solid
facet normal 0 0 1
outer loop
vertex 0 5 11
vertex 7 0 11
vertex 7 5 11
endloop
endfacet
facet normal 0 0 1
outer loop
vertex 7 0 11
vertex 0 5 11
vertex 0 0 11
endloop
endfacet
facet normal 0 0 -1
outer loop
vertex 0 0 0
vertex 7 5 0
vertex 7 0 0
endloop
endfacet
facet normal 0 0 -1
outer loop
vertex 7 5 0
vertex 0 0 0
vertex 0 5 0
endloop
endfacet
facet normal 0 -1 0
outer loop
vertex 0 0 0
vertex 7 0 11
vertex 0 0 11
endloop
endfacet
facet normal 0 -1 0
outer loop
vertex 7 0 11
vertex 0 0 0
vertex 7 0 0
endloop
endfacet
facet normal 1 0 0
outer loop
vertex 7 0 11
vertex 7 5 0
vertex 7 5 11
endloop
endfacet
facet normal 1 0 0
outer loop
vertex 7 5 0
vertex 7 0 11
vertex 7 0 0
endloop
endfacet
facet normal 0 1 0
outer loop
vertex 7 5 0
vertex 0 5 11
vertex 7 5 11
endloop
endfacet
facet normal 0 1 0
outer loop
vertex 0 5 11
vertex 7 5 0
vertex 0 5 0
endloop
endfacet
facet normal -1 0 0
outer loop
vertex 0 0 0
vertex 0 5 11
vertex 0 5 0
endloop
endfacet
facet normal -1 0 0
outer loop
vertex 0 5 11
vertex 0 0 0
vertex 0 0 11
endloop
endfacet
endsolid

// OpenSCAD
// Generated by SolidPython 1.0.1 on 2020-07-29 00:46:55


cube(size = [7, 5, 11]);
/***********************************************
*********      SolidPython code:      **********
************************************************
 
# import packages: SolidPython
from solid import *
from solid.utils import *
from itertools import chain, combinations, permutations


class Resize:

    def __init__(self, scad_file):
        self.scad_file = scad_file
        #self.scad_file = import_scad(scad_file)
        # cone/cylinder param:
        self.r1 = 0
        self.r2 = 0
        self.h = 0
        # rectangular prism param:
        self.w = 0
        self.l = 0
        # ellipse param:
        self.r = 0

    # import OpenScad code (file name corresponds to shape)


    # classify shape + parameters
    def assign(self, param1, param2, param3):
        if self.scad_file == 'cone.scad':
            self.r1 = param1
            self.r2 = param2
            self.h = param3
        elif self.scad_file == 'cylinder.scad':
            self.r1 = param1
            self.r2 = param2
            self.h = param3
        elif self.scad_file == 'rectangularPrism.scad':
            self.h = param1
            self.l = param2
            self.w = param3
        else:
            self.r = param1
            self.h = param2

    # resize parameters
    def iterate(self):
        x = range(3, 20, 2)
        i = 1
        if self.scad_file == 'cone.scad':
            tempList = list(permutations(x, 2))
            for temp in tempList:
                param1 = temp[0]
                param2 = temp[1]
                filepath = 'produced_scad_files/' + 'cone' + str(param1) + '_' + str(param2) + '_' + '.scad'
                scad_render_to_file(cylinder(h=param1, r1=param2, r2=0), filepath)

        elif self.scad_file == 'cylinder.scad':
            tempList = list(permutations(x, 3))
            for temp in tempList:
                param1 = temp[0]
                param2 = temp[1]
                filepath = 'produced_scad_files/' + 'cylinder' + str(param1) + '_' + str(param2) + '_' + '.scad'
                scad_render_to_file(cylinder(h=param1, r1=param2, r2=param2), filepath)

        elif self.scad_file == 'rectangularPrism.scad':
            tempList = list(permutations(x, 3))
            for temp in tempList:
                param1 = temp[0]
                param2 = temp[1]
                param3 = temp[2]
                filepath = 'produced_scad_files/' + 'rectangularPrism' + str(param1) + '_' + str(param2) + '_' + str(
                    param3) + '.scad'
                scad_render_to_file(cube(size=(param1, param2, param3)), filepath)

        elif self.scad_file == 'ellipse.scad':
            tempList = list(permutations(x, 4))
            for temp in tempList:
                param1 = temp[0]
                param2 = temp[1]
                param3 = temp[2]
                param4 = temp[3]
                filepath = 'produced_scad_files/' + 'ellipse' + str(param1) + '_' + str(param2) + '_' + str(param3) + '_' + str(param4) + '.scad'
                scad_render_to_file(scale([param1, param2, param3])(sphere(r=param4)), filepath)

    def render_to_scadfile(self):
        scad_render_to_file(scad, 'example.scad') 
 
************************************************/
